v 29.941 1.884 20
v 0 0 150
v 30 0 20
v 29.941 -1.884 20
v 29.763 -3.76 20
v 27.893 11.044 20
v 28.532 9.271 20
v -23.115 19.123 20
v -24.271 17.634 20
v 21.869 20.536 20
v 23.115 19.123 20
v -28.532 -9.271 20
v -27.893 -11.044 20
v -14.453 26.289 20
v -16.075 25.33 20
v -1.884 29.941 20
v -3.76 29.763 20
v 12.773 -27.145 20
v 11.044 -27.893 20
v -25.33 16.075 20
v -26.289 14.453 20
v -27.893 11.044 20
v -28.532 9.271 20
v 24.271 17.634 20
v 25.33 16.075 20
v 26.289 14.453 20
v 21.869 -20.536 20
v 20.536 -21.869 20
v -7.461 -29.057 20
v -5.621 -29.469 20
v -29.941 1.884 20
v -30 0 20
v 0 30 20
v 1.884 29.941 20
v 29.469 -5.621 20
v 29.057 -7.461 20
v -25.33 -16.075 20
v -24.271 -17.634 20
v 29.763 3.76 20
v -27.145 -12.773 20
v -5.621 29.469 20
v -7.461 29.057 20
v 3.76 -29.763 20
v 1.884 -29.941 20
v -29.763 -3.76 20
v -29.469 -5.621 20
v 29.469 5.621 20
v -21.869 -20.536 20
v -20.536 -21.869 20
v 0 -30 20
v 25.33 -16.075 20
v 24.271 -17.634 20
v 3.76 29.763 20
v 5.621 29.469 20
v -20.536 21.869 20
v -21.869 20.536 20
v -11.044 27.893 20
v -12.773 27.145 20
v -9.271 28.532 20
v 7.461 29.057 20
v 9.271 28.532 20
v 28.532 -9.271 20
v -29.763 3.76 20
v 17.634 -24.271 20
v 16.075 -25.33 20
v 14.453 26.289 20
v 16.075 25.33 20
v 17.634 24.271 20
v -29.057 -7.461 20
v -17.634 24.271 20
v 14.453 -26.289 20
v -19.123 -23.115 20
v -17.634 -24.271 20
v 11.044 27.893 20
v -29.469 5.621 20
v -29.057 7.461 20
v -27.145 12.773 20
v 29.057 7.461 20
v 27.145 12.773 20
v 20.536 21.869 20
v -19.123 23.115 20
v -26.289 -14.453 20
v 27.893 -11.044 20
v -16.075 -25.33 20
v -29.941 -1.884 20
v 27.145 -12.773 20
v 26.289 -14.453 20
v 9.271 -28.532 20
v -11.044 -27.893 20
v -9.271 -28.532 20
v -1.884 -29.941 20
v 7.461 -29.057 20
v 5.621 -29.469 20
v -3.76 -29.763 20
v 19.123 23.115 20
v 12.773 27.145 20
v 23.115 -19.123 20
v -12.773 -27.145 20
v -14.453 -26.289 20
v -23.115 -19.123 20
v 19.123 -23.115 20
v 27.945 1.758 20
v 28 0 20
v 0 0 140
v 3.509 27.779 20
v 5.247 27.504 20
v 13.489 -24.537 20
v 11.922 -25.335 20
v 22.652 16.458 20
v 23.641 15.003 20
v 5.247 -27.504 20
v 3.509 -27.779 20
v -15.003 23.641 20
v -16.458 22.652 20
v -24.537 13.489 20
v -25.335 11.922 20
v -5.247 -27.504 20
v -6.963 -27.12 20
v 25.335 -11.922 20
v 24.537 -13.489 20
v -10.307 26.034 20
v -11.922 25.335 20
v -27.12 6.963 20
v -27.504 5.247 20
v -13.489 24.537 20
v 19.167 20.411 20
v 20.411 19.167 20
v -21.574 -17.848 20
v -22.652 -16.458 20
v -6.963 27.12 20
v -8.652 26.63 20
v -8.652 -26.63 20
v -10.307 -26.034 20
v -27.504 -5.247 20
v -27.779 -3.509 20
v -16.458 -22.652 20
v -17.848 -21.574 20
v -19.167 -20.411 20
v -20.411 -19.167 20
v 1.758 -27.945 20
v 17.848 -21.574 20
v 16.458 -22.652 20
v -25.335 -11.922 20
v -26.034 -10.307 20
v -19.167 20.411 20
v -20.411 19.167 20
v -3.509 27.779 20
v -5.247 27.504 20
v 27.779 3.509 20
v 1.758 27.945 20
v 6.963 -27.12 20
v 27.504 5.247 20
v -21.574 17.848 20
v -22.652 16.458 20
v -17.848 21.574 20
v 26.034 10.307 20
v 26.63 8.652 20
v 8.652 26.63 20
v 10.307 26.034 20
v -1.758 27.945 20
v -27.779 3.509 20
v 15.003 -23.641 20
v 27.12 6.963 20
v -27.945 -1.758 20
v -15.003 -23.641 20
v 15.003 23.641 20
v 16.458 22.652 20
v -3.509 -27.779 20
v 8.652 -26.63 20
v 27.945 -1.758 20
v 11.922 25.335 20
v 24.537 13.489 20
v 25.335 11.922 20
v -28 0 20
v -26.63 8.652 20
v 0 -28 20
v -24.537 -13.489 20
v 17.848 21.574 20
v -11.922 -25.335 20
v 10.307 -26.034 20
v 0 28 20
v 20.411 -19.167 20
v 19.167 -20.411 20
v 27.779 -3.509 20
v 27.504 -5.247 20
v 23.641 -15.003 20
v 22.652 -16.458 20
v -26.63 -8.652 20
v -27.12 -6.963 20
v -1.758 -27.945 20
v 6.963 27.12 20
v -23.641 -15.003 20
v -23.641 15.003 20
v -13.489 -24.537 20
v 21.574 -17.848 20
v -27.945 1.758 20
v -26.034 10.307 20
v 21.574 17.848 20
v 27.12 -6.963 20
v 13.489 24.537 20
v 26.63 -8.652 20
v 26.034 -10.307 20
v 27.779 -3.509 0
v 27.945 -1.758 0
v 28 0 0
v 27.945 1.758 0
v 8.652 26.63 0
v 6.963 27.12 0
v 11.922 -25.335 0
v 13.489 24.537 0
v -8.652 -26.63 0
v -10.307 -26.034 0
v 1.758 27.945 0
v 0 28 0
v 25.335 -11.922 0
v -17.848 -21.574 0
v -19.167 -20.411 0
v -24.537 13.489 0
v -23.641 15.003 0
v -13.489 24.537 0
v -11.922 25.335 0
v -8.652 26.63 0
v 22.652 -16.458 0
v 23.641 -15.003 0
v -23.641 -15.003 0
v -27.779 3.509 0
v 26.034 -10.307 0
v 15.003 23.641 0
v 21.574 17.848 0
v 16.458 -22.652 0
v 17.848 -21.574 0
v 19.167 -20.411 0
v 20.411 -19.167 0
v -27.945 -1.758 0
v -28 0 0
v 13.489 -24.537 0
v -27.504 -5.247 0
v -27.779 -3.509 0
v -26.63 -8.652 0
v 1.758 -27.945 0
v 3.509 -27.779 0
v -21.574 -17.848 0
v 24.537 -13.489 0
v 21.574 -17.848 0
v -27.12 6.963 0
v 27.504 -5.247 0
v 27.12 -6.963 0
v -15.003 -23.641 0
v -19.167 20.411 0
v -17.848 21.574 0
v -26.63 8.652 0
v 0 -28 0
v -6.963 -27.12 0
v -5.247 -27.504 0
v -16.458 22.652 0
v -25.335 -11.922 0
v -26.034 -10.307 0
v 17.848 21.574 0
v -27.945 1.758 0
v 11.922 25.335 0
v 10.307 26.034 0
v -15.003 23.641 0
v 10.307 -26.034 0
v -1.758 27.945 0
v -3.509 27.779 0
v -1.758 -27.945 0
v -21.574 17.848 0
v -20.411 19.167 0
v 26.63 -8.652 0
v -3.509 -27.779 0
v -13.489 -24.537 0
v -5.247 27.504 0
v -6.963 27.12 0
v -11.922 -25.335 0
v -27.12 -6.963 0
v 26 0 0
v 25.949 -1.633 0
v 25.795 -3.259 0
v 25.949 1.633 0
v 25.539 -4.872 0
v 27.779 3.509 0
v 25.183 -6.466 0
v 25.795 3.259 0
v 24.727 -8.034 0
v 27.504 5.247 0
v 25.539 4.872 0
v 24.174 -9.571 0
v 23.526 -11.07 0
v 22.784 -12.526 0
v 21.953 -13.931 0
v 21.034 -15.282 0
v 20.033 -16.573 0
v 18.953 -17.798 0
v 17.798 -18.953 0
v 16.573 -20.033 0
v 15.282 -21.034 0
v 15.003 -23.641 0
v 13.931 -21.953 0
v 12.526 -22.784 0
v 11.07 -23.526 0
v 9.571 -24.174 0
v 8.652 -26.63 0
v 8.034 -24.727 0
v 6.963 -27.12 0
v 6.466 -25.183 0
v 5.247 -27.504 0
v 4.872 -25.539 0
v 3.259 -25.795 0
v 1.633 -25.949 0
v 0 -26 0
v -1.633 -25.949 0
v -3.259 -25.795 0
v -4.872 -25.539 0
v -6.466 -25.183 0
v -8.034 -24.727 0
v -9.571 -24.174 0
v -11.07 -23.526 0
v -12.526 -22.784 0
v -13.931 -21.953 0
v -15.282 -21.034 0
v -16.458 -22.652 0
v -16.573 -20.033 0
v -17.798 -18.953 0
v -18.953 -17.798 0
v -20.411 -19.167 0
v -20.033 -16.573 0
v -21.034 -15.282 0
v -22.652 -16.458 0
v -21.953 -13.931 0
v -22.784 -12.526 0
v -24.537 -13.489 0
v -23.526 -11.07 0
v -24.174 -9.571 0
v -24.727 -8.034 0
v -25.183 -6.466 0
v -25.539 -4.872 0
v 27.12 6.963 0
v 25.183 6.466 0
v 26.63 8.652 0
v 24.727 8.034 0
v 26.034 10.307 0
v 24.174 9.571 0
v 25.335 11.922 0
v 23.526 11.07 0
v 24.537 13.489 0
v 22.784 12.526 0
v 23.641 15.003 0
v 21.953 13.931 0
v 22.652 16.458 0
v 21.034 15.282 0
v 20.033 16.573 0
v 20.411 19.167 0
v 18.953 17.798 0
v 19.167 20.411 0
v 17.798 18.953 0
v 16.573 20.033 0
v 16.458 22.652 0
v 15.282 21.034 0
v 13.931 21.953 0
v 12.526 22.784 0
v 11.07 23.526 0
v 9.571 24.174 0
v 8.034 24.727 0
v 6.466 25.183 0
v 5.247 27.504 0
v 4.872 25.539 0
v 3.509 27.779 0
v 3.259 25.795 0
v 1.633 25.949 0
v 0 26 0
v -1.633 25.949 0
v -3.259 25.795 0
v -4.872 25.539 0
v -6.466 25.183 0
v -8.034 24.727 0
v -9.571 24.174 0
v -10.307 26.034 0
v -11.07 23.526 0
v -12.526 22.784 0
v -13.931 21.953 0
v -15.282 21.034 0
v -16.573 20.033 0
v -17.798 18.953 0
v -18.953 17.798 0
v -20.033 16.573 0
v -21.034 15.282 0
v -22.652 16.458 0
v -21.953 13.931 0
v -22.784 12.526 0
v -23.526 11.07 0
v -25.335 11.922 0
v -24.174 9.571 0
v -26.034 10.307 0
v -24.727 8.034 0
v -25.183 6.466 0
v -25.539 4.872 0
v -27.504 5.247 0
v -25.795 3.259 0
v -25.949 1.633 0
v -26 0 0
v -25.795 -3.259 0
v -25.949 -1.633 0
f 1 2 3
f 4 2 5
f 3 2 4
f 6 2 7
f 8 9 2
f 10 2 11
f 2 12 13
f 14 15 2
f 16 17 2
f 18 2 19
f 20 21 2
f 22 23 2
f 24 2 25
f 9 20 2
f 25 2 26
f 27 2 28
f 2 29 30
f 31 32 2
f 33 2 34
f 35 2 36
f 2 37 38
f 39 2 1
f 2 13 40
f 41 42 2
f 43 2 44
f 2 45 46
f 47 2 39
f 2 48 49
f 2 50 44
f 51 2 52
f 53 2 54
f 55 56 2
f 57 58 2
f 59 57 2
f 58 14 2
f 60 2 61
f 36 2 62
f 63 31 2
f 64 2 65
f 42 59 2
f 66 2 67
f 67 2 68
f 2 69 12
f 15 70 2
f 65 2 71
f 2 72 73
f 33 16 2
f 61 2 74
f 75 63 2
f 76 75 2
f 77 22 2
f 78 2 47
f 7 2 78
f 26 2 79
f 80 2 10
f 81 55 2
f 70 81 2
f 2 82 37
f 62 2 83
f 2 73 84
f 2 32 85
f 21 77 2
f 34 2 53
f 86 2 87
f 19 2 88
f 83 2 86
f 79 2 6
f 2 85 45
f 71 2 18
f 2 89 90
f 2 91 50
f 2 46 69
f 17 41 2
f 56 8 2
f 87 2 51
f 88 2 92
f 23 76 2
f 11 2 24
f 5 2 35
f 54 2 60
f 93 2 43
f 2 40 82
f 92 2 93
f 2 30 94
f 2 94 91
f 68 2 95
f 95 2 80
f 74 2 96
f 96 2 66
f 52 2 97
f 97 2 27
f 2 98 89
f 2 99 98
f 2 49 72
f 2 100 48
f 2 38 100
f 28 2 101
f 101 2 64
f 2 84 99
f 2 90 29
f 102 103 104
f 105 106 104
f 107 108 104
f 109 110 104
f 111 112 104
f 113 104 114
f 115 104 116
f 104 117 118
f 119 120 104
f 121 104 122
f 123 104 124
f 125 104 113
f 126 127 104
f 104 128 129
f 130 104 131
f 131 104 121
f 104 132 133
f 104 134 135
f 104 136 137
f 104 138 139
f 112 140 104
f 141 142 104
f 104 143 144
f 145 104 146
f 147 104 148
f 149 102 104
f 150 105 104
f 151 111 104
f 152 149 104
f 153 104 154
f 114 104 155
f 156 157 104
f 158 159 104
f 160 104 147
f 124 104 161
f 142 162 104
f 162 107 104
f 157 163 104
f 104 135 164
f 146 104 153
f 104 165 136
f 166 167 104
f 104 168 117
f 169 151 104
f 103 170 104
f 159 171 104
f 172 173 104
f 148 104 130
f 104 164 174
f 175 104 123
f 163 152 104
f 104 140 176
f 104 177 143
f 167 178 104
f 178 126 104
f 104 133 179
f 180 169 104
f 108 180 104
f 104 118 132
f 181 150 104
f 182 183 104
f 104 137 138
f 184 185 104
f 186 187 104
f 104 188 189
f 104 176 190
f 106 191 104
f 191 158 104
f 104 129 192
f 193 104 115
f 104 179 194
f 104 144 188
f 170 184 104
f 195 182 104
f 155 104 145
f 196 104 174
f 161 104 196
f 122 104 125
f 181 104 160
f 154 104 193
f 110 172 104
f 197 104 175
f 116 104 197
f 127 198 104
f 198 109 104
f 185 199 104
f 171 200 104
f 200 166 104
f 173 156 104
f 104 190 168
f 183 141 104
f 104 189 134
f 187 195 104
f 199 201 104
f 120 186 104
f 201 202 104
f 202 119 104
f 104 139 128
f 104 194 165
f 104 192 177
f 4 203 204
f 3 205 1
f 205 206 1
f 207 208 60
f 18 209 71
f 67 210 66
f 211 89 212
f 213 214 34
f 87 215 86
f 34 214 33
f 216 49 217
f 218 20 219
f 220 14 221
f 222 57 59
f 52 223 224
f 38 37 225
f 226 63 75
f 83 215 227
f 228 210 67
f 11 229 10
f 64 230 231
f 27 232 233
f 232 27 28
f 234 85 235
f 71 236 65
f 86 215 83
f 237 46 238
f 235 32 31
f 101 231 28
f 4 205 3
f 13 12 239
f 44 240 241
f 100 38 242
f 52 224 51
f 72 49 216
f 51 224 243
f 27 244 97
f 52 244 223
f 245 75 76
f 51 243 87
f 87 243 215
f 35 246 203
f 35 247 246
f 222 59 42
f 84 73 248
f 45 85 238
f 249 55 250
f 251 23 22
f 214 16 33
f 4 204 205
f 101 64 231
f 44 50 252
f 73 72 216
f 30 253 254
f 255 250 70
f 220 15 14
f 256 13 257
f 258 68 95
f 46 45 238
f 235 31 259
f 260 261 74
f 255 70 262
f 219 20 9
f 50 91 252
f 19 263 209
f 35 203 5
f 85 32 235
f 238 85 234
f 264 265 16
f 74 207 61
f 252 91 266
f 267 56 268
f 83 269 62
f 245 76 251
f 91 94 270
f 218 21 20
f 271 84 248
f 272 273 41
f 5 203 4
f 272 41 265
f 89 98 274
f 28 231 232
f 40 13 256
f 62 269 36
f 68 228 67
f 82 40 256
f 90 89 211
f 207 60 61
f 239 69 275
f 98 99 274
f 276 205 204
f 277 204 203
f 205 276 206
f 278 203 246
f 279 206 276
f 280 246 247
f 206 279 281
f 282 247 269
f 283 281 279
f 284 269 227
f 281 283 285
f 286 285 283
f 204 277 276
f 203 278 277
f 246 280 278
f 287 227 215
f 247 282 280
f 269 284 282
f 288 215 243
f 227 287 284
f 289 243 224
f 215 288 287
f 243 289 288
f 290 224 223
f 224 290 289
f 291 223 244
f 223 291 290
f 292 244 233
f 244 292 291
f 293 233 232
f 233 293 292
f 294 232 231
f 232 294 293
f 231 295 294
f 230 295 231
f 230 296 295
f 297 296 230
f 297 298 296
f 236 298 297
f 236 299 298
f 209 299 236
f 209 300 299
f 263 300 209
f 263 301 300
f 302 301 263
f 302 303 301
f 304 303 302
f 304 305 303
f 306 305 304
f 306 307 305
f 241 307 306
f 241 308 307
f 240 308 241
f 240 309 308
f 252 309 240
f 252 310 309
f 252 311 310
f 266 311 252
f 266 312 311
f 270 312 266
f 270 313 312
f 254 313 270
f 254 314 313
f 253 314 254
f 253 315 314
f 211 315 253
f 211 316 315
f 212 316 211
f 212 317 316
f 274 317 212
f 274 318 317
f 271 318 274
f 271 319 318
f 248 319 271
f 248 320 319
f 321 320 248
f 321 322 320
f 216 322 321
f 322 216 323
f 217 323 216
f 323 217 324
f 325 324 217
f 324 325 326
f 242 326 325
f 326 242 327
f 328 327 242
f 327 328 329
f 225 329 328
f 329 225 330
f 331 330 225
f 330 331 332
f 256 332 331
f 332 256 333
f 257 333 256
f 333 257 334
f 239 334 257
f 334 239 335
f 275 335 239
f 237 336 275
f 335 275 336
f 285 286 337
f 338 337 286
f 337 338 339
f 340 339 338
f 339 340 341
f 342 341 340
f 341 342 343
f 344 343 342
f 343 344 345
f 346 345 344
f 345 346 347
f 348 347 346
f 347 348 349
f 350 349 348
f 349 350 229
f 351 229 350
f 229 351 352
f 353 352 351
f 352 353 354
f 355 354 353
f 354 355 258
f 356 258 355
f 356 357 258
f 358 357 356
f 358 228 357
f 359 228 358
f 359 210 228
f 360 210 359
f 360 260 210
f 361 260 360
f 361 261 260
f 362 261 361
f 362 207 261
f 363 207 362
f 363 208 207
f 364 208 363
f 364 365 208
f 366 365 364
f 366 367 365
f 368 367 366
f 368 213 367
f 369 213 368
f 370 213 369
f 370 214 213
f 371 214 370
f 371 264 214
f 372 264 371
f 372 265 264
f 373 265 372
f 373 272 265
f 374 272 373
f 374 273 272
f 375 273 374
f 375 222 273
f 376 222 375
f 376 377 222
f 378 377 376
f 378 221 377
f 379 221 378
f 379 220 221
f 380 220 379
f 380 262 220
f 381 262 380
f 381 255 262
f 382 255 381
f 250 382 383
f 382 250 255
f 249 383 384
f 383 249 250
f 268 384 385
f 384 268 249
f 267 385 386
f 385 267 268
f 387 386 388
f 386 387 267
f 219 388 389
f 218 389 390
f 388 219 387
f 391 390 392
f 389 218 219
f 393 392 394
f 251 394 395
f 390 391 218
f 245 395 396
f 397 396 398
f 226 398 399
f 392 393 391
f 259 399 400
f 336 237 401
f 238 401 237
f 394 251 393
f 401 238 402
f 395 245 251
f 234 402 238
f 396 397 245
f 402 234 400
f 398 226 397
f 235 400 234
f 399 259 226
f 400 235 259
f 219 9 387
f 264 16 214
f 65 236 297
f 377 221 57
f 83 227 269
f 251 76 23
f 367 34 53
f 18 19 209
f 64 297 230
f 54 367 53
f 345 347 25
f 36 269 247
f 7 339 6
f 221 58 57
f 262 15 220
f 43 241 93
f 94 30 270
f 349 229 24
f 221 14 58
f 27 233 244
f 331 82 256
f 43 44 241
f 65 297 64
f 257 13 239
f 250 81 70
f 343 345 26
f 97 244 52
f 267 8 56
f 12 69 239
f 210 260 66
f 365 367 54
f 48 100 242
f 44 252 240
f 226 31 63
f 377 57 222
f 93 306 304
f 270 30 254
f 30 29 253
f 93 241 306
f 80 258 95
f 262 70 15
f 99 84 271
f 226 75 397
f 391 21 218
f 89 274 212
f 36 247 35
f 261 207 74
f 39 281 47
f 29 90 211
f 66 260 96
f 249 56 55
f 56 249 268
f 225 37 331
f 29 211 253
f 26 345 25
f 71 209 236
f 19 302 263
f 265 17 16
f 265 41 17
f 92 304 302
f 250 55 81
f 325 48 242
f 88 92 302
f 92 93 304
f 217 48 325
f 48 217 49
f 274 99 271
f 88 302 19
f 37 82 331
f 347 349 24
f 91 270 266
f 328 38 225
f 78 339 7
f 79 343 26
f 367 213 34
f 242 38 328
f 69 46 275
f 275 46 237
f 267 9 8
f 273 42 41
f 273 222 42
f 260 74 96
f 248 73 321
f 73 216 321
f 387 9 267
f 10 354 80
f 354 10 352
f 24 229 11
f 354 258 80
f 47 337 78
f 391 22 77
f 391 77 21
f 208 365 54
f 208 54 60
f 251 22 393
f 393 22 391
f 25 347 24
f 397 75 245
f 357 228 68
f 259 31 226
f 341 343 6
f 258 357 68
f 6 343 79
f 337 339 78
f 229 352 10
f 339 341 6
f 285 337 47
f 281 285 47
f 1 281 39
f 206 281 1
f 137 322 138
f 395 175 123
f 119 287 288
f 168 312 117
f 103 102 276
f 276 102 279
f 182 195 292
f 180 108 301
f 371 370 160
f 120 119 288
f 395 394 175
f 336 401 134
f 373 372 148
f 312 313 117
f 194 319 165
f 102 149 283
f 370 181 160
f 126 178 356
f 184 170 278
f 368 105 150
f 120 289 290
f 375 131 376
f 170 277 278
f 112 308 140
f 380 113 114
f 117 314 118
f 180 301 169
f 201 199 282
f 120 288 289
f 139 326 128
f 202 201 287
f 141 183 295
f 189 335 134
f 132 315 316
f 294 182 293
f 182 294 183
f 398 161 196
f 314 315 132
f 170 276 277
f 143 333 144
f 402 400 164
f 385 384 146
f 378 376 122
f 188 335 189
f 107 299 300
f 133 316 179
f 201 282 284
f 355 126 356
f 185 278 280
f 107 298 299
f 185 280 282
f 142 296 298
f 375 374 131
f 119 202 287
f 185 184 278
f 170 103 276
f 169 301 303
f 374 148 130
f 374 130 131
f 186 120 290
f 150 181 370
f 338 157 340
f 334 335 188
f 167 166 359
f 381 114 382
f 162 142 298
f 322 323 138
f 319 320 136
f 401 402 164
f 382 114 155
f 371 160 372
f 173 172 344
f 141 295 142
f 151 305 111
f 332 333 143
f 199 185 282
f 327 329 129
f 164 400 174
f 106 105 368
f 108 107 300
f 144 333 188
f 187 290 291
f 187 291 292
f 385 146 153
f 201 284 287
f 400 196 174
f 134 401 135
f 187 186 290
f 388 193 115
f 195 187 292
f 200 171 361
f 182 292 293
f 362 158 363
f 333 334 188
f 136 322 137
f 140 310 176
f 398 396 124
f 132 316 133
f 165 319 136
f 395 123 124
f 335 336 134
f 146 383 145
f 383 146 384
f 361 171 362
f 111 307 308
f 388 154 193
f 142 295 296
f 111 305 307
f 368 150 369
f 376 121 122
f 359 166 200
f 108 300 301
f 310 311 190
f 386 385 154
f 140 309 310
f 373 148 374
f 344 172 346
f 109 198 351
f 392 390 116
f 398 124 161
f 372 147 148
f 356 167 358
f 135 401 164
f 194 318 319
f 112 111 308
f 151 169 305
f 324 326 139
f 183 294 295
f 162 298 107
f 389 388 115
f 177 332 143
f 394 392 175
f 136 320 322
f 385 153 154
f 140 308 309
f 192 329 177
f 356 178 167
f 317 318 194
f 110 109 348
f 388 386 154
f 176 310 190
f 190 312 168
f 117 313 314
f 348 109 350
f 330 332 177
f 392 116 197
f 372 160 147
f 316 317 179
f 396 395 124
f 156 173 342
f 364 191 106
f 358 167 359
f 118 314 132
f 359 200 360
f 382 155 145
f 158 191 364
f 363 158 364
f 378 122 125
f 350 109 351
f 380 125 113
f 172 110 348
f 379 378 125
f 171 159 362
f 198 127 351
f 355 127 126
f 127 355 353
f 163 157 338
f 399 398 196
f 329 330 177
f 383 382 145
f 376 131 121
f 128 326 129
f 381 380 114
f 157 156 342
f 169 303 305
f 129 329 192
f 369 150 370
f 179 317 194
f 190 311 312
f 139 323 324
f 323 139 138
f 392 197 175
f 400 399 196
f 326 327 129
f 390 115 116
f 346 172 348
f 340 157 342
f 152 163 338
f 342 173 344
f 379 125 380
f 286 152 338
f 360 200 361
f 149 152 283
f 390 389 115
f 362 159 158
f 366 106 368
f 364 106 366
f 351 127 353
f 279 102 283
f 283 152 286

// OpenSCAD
$fn = 100;

union() {
    translate([ 0, 0, 20]) {
        difference() {
            cylinder(r1 = 30, r2 = 0, h = 130);
            cylinder(r1 = 28, r2 = 0, h = 120);
        }
    }
    difference() {
        cylinder(r1 = 28, r2 = 30, h = 20);
        cylinder(r1 = 26, r2 = 28, h = 20);
    }
}
